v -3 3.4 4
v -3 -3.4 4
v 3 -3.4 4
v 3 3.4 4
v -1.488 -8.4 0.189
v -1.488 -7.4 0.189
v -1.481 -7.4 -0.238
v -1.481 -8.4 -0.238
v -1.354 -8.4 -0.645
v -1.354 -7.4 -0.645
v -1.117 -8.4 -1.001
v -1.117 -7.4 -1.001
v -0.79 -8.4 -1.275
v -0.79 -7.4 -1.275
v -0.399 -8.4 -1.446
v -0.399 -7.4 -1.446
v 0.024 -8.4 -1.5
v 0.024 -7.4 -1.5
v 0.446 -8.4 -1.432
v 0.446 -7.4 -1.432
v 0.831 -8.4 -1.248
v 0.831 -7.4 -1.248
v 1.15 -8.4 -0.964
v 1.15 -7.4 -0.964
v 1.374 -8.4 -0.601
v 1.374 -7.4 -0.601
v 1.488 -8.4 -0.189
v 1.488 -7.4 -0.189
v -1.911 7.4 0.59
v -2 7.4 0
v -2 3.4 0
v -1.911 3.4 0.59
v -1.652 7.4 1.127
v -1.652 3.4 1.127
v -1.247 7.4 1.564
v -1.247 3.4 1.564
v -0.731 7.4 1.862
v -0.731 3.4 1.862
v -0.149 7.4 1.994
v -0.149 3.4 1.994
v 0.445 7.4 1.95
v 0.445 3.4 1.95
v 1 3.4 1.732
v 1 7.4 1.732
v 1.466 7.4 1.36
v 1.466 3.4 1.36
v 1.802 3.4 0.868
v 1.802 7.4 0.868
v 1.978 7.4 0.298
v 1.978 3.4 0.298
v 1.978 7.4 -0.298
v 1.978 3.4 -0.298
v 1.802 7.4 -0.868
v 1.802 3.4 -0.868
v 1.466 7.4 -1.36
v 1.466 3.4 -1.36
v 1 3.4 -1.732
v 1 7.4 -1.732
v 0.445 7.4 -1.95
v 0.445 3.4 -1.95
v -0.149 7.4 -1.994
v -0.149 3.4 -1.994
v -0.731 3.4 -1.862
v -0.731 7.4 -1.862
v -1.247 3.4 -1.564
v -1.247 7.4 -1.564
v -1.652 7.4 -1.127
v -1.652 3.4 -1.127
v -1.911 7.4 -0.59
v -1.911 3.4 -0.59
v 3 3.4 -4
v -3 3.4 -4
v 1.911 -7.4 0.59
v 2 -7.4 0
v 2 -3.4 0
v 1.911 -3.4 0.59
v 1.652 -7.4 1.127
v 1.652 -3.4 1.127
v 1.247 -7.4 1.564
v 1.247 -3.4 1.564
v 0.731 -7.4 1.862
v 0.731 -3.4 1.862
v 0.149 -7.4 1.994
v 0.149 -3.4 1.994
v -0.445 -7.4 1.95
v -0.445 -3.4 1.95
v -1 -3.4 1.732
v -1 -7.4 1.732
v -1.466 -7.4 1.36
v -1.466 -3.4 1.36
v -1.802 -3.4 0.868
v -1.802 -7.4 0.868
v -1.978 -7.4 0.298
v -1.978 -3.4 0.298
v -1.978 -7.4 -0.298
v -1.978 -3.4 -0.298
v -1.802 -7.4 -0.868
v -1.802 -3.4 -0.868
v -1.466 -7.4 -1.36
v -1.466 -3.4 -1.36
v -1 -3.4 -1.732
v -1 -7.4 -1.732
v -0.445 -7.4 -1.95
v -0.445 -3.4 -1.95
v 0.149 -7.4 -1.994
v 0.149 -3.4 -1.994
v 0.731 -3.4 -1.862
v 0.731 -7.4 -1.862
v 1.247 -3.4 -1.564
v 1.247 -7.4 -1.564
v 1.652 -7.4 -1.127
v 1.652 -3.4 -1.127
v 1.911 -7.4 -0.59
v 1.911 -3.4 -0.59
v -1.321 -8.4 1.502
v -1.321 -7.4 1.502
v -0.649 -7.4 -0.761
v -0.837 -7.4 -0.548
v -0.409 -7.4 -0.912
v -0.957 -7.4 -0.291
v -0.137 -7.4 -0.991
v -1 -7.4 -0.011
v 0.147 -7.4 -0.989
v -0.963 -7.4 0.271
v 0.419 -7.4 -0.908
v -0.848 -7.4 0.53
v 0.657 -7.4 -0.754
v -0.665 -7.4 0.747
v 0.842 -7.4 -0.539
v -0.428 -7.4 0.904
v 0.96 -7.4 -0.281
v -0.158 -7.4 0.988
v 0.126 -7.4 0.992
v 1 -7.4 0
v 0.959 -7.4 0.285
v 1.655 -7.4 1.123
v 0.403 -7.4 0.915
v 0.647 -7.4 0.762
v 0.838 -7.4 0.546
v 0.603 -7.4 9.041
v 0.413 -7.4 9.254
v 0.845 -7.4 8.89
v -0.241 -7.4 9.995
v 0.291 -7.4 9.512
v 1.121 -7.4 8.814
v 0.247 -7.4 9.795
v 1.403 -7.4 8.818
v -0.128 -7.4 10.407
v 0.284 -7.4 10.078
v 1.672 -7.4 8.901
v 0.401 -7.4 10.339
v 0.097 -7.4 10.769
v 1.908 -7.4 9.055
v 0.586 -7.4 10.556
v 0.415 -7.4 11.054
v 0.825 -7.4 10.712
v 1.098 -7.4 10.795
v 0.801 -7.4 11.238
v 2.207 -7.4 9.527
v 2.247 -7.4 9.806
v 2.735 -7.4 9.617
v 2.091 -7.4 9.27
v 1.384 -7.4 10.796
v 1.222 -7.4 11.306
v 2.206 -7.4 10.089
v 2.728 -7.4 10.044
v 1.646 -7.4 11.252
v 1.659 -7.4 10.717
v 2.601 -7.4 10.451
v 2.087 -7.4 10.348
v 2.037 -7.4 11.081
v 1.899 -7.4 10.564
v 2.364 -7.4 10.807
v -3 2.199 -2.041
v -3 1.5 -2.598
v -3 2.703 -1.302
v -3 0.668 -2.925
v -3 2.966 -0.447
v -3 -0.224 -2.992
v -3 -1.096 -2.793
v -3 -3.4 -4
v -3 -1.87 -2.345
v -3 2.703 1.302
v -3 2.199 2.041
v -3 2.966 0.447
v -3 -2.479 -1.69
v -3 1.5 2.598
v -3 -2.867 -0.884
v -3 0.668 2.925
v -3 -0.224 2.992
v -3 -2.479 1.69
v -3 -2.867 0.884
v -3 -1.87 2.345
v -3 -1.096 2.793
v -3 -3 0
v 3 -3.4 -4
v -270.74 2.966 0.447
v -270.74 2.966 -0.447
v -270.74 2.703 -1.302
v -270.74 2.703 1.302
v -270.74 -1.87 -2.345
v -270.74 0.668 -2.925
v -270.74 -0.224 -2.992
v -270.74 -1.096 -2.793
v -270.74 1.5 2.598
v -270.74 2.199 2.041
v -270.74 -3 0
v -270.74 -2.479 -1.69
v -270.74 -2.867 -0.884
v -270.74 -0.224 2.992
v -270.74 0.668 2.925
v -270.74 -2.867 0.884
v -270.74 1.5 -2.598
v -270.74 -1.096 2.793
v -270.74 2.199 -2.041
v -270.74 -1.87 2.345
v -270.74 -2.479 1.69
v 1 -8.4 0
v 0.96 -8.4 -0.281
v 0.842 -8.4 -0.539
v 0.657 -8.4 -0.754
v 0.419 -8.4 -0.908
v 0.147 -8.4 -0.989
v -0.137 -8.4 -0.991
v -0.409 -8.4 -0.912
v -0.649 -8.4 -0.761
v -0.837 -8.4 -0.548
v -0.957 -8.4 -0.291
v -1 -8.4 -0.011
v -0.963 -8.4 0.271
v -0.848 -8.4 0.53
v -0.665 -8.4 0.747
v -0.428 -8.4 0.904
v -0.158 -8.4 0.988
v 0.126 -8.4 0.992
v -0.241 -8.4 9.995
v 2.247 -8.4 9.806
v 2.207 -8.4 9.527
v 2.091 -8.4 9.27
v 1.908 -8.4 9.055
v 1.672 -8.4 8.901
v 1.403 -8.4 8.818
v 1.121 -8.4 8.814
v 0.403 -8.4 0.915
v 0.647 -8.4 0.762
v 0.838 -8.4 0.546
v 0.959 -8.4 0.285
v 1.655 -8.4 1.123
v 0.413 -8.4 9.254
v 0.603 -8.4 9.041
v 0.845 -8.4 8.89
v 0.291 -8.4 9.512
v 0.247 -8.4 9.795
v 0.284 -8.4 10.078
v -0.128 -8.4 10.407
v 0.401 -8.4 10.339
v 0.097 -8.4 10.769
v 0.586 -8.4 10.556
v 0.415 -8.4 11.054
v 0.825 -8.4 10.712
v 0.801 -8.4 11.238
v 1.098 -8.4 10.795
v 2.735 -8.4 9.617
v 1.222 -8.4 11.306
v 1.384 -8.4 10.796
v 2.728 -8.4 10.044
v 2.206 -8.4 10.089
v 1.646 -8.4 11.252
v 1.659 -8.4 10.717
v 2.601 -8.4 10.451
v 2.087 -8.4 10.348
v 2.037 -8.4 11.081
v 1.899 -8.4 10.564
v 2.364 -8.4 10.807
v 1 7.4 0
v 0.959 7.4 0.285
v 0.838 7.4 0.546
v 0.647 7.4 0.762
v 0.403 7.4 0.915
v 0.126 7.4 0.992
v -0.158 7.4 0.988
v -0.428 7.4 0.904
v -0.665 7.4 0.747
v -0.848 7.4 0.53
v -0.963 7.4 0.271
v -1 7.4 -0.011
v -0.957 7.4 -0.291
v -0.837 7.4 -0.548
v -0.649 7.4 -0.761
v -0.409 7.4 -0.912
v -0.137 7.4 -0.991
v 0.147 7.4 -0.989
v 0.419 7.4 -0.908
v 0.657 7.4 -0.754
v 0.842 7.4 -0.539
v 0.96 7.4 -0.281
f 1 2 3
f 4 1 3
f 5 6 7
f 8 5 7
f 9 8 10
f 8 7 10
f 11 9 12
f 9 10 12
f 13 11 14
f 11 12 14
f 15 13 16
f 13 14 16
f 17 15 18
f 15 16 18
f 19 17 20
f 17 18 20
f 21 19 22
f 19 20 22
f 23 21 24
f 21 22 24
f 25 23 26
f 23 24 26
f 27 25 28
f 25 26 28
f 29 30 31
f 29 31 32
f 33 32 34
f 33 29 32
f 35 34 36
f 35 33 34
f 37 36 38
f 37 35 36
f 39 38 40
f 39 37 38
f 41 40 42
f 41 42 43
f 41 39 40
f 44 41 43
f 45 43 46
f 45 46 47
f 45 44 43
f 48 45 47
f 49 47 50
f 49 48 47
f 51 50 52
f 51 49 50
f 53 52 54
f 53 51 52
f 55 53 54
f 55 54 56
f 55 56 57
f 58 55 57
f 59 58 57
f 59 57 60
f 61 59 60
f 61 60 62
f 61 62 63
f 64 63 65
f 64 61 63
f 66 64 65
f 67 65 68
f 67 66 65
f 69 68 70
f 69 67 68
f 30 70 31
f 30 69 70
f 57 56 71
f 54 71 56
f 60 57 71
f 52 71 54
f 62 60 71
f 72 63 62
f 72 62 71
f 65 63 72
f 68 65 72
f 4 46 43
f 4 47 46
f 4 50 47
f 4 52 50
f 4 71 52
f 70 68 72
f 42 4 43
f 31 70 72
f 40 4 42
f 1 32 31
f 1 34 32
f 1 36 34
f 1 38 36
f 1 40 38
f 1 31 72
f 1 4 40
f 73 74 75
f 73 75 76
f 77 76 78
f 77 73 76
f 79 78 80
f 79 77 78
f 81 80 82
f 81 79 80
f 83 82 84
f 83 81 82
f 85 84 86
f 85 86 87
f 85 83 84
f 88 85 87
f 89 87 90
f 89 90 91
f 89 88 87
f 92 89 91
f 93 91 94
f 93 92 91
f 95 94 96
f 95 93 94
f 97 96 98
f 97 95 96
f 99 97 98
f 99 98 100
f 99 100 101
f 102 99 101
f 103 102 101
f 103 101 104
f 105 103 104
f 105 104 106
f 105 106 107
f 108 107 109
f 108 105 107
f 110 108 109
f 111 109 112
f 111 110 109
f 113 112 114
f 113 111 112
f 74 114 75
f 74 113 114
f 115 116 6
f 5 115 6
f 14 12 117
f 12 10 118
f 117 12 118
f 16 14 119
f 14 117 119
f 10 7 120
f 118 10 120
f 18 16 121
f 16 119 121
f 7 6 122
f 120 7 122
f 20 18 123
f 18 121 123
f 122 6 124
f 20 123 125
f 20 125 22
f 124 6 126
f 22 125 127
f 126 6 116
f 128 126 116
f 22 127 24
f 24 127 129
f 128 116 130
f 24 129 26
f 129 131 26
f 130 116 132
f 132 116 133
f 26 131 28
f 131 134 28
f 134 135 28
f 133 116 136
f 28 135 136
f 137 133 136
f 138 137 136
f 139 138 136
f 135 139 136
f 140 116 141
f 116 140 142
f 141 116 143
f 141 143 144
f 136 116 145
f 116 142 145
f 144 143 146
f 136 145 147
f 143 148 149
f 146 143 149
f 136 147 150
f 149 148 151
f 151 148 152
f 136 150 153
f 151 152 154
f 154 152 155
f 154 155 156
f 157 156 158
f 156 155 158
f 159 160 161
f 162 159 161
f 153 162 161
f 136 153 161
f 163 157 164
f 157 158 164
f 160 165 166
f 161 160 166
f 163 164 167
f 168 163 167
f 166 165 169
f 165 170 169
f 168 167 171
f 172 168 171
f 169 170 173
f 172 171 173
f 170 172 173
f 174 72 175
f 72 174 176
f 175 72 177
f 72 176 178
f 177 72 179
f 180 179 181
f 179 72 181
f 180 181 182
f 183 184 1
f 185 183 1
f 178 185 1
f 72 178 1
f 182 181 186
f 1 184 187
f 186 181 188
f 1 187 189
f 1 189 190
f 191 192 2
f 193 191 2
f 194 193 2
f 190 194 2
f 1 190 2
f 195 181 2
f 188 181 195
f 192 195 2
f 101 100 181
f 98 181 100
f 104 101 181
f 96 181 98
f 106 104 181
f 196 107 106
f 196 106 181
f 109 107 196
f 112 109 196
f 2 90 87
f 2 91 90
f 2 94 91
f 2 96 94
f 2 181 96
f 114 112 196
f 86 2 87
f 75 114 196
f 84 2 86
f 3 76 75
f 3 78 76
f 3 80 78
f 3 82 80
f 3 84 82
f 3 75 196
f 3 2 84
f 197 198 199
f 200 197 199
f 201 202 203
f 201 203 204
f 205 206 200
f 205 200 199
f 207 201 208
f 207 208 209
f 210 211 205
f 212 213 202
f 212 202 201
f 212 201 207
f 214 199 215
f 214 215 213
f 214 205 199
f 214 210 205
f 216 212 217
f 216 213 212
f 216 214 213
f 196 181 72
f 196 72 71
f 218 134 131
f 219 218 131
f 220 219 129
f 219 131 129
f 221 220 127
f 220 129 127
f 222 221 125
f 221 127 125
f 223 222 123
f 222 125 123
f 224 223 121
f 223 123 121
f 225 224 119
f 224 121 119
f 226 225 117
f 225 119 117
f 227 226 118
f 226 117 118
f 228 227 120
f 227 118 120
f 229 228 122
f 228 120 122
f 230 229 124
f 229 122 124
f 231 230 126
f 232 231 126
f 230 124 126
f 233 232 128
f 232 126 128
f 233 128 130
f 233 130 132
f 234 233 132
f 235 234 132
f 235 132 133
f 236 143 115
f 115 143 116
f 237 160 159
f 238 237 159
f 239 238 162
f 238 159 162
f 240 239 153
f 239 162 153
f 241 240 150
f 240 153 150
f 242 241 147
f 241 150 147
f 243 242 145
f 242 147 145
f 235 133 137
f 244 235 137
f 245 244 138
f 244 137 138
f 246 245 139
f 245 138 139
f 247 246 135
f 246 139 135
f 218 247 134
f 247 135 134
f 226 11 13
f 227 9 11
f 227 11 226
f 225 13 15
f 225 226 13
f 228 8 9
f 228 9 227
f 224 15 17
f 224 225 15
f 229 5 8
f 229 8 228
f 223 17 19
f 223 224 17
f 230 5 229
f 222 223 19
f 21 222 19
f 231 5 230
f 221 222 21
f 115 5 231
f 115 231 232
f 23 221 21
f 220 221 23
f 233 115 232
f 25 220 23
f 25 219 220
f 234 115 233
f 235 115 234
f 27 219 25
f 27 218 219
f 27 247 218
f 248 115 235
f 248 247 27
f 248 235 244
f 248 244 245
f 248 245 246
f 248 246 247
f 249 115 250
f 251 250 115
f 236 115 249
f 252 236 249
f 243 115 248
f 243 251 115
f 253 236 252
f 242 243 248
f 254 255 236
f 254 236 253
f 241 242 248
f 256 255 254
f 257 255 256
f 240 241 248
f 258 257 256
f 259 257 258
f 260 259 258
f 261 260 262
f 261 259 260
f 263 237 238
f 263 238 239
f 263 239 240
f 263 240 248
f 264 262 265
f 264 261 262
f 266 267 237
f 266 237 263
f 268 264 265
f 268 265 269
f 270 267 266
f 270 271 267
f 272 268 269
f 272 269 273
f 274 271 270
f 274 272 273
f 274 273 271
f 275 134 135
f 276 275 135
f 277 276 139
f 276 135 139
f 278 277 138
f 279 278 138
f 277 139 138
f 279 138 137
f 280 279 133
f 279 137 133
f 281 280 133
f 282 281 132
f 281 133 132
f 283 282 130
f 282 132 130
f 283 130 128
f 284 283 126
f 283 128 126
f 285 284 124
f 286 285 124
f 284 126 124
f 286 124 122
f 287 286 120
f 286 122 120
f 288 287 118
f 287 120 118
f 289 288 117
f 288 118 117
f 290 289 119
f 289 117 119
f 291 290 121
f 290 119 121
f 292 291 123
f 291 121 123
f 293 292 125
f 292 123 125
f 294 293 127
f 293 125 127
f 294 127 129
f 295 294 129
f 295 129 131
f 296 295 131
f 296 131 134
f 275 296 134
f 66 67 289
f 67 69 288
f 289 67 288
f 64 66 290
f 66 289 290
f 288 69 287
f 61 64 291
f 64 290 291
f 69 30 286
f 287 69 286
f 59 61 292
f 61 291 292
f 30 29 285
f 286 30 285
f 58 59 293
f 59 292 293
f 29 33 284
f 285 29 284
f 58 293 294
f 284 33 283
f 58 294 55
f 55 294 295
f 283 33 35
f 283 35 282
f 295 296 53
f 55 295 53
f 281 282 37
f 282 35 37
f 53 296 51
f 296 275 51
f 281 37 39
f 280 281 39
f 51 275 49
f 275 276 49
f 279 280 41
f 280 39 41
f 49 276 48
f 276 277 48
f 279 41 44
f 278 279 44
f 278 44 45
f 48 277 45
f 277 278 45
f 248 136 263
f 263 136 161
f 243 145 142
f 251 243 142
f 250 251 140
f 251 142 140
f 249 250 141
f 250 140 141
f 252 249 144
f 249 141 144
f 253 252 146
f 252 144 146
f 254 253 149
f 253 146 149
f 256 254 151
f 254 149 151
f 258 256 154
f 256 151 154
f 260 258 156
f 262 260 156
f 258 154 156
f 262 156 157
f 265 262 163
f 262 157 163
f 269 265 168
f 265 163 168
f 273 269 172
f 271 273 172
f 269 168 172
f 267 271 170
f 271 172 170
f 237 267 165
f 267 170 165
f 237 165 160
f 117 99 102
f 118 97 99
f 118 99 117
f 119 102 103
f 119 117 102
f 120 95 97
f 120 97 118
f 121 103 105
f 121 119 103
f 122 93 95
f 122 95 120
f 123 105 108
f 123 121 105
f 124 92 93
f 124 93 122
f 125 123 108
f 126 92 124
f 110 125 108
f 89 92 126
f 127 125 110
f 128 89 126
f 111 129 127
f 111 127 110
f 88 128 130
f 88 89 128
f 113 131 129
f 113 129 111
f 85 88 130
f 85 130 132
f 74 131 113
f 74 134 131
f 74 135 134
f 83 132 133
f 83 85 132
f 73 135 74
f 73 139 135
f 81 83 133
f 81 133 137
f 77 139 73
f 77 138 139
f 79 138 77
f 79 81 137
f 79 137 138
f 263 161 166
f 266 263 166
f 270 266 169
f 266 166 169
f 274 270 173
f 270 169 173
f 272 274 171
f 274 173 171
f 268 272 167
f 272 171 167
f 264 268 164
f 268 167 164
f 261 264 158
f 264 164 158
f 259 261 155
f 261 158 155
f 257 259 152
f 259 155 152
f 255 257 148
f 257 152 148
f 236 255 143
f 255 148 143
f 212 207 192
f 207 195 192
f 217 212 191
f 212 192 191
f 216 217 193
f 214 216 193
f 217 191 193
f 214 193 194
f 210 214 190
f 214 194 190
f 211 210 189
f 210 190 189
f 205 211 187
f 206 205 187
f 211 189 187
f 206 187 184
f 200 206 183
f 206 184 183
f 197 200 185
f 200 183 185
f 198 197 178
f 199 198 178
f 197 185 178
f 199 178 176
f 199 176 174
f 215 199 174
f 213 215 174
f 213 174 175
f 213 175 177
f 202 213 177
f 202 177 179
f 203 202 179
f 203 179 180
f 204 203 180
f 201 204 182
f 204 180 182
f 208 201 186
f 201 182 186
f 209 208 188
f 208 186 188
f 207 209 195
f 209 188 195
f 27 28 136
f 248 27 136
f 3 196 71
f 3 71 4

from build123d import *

# Parameters (mm, degrees)
F0_W      = 6
F0_H      = 8
F1_DEPTH  = 7.4
F2_W      = 6
F2_H      = 8
F2_R      = 2
F3_DEPTH  = 4
F4_W      = 6
F4_H      = 8
F4_R      = 2
F5_DEPTH  = 4
F6_R      = 3
F7_DEPTH  = 167.74
F8_R      = 3
F9_DEPTH  = 100
F11_DEPTH = 14.801
F12_DEPTH = 1


with BuildPart() as f1:
    # F0 (on Front) → F1 (new body, symmetric)
    with BuildSketch(Plane.XZ):
        Rectangle(F0_W, F0_H)
    extrude(amount=F1_DEPTH, both=True)

    # F2 (on face) → F3 (cut)
    with BuildSketch(Plane.XZ.offset(7.4)):
        Rectangle(F2_W, F2_H)
        Circle(F2_R, mode=Mode.SUBTRACT)
    extrude(amount=-F3_DEPTH, mode=Mode.SUBTRACT)

    # F4 (on face) → F5 (cut)
    with BuildSketch(Plane(origin=(0, 7.4, 0), x_dir=(-1, 0, 0), z_dir=(0, 1, 0))):
        Rectangle(F4_W, F4_H)
        Circle(F4_R, mode=Mode.SUBTRACT)
    extrude(amount=-F5_DEPTH, mode=Mode.SUBTRACT)

    # F6 (on face) → F7 (join)
    with BuildSketch(Plane(origin=(-3, 0, 0), x_dir=(0, -1, 0), z_dir=(-1, 0, 0))):
        Circle(F6_R)
    extrude(amount=F7_DEPTH)

    # F8 (on face) → F9 (join)
    with BuildSketch(Plane(origin=(-170.74, 0, 0), x_dir=(0, -1, 0), z_dir=(-1, 0, 0))):
        Circle(F8_R)
    extrude(amount=F9_DEPTH)

    # F10 (on face) → F11 (cut, through all)
    with BuildSketch(Plane.XZ.offset(7.4)):
        with BuildLine():
            ThreePointArc((0.126134, 0.992013), (-0.750378, -0.661009), (1, 0))
            ThreePointArc((1, 0), (0.750378, 0.661009), (0.126134, 0.992013))
        make_face()
    extrude(amount=-F11_DEPTH, mode=Mode.SUBTRACT)


with BuildPart() as f12:
    # F10 (on face) → F12 (new body)
    with BuildSketch(Plane.XZ.offset(7.4)):
        with BuildLine():
            ThreePointArc((-1.321161, 1.501511), (-0.586377, 1.912109), (0.252268, 1.984026))
            ThreePointArc((0.252268, 1.984026), (1.04623, 1.704524), (1.654879, 1.123109))
            Line((1.654879, 1.123109), (2.734826, 9.61664))
            ThreePointArc((2.734826, 9.61664), (1.436007, 11.293861), (-0.241214, 9.995042))
            Line((-0.241214, 9.995042), (-1.321161, 1.501511))
        make_face()
        with BuildLine():
            ThreePointArc((2.246806, 9.805841), (1.907815, 9.055463), (1.120672, 8.813828))
            ThreePointArc((1.120672, 8.813828), (0.585797, 10.556219), (2.246806, 9.805841))
        make_face(mode=Mode.SUBTRACT)
        with BuildLine():
            ThreePointArc((1.654879, 1.123109), (1.04623, 1.704524), (0.252268, 1.984026))
            ThreePointArc((0.252268, 1.984026), (-0.586377, 1.912109), (-1.321161, 1.501511))
            Line((-1.321161, 1.501511), (-1.48802, 0.189201))
            ThreePointArc((-1.48802, 0.189201), (-0.189201, -1.48802), (1.48802, -0.189201))
            Line((1.48802, -0.189201), (1.654879, 1.123109))
        make_face()
        with BuildLine():
            ThreePointArc((0.126134, 0.992013), (0.750378, 0.661009), (1, 0))
            ThreePointArc((1, 0), (-0.750378, -0.661009), (0.126134, 0.992013))
        make_face(mode=Mode.SUBTRACT)
    extrude(amount=F12_DEPTH)


solid = Compound([f1.part, f12.part])
